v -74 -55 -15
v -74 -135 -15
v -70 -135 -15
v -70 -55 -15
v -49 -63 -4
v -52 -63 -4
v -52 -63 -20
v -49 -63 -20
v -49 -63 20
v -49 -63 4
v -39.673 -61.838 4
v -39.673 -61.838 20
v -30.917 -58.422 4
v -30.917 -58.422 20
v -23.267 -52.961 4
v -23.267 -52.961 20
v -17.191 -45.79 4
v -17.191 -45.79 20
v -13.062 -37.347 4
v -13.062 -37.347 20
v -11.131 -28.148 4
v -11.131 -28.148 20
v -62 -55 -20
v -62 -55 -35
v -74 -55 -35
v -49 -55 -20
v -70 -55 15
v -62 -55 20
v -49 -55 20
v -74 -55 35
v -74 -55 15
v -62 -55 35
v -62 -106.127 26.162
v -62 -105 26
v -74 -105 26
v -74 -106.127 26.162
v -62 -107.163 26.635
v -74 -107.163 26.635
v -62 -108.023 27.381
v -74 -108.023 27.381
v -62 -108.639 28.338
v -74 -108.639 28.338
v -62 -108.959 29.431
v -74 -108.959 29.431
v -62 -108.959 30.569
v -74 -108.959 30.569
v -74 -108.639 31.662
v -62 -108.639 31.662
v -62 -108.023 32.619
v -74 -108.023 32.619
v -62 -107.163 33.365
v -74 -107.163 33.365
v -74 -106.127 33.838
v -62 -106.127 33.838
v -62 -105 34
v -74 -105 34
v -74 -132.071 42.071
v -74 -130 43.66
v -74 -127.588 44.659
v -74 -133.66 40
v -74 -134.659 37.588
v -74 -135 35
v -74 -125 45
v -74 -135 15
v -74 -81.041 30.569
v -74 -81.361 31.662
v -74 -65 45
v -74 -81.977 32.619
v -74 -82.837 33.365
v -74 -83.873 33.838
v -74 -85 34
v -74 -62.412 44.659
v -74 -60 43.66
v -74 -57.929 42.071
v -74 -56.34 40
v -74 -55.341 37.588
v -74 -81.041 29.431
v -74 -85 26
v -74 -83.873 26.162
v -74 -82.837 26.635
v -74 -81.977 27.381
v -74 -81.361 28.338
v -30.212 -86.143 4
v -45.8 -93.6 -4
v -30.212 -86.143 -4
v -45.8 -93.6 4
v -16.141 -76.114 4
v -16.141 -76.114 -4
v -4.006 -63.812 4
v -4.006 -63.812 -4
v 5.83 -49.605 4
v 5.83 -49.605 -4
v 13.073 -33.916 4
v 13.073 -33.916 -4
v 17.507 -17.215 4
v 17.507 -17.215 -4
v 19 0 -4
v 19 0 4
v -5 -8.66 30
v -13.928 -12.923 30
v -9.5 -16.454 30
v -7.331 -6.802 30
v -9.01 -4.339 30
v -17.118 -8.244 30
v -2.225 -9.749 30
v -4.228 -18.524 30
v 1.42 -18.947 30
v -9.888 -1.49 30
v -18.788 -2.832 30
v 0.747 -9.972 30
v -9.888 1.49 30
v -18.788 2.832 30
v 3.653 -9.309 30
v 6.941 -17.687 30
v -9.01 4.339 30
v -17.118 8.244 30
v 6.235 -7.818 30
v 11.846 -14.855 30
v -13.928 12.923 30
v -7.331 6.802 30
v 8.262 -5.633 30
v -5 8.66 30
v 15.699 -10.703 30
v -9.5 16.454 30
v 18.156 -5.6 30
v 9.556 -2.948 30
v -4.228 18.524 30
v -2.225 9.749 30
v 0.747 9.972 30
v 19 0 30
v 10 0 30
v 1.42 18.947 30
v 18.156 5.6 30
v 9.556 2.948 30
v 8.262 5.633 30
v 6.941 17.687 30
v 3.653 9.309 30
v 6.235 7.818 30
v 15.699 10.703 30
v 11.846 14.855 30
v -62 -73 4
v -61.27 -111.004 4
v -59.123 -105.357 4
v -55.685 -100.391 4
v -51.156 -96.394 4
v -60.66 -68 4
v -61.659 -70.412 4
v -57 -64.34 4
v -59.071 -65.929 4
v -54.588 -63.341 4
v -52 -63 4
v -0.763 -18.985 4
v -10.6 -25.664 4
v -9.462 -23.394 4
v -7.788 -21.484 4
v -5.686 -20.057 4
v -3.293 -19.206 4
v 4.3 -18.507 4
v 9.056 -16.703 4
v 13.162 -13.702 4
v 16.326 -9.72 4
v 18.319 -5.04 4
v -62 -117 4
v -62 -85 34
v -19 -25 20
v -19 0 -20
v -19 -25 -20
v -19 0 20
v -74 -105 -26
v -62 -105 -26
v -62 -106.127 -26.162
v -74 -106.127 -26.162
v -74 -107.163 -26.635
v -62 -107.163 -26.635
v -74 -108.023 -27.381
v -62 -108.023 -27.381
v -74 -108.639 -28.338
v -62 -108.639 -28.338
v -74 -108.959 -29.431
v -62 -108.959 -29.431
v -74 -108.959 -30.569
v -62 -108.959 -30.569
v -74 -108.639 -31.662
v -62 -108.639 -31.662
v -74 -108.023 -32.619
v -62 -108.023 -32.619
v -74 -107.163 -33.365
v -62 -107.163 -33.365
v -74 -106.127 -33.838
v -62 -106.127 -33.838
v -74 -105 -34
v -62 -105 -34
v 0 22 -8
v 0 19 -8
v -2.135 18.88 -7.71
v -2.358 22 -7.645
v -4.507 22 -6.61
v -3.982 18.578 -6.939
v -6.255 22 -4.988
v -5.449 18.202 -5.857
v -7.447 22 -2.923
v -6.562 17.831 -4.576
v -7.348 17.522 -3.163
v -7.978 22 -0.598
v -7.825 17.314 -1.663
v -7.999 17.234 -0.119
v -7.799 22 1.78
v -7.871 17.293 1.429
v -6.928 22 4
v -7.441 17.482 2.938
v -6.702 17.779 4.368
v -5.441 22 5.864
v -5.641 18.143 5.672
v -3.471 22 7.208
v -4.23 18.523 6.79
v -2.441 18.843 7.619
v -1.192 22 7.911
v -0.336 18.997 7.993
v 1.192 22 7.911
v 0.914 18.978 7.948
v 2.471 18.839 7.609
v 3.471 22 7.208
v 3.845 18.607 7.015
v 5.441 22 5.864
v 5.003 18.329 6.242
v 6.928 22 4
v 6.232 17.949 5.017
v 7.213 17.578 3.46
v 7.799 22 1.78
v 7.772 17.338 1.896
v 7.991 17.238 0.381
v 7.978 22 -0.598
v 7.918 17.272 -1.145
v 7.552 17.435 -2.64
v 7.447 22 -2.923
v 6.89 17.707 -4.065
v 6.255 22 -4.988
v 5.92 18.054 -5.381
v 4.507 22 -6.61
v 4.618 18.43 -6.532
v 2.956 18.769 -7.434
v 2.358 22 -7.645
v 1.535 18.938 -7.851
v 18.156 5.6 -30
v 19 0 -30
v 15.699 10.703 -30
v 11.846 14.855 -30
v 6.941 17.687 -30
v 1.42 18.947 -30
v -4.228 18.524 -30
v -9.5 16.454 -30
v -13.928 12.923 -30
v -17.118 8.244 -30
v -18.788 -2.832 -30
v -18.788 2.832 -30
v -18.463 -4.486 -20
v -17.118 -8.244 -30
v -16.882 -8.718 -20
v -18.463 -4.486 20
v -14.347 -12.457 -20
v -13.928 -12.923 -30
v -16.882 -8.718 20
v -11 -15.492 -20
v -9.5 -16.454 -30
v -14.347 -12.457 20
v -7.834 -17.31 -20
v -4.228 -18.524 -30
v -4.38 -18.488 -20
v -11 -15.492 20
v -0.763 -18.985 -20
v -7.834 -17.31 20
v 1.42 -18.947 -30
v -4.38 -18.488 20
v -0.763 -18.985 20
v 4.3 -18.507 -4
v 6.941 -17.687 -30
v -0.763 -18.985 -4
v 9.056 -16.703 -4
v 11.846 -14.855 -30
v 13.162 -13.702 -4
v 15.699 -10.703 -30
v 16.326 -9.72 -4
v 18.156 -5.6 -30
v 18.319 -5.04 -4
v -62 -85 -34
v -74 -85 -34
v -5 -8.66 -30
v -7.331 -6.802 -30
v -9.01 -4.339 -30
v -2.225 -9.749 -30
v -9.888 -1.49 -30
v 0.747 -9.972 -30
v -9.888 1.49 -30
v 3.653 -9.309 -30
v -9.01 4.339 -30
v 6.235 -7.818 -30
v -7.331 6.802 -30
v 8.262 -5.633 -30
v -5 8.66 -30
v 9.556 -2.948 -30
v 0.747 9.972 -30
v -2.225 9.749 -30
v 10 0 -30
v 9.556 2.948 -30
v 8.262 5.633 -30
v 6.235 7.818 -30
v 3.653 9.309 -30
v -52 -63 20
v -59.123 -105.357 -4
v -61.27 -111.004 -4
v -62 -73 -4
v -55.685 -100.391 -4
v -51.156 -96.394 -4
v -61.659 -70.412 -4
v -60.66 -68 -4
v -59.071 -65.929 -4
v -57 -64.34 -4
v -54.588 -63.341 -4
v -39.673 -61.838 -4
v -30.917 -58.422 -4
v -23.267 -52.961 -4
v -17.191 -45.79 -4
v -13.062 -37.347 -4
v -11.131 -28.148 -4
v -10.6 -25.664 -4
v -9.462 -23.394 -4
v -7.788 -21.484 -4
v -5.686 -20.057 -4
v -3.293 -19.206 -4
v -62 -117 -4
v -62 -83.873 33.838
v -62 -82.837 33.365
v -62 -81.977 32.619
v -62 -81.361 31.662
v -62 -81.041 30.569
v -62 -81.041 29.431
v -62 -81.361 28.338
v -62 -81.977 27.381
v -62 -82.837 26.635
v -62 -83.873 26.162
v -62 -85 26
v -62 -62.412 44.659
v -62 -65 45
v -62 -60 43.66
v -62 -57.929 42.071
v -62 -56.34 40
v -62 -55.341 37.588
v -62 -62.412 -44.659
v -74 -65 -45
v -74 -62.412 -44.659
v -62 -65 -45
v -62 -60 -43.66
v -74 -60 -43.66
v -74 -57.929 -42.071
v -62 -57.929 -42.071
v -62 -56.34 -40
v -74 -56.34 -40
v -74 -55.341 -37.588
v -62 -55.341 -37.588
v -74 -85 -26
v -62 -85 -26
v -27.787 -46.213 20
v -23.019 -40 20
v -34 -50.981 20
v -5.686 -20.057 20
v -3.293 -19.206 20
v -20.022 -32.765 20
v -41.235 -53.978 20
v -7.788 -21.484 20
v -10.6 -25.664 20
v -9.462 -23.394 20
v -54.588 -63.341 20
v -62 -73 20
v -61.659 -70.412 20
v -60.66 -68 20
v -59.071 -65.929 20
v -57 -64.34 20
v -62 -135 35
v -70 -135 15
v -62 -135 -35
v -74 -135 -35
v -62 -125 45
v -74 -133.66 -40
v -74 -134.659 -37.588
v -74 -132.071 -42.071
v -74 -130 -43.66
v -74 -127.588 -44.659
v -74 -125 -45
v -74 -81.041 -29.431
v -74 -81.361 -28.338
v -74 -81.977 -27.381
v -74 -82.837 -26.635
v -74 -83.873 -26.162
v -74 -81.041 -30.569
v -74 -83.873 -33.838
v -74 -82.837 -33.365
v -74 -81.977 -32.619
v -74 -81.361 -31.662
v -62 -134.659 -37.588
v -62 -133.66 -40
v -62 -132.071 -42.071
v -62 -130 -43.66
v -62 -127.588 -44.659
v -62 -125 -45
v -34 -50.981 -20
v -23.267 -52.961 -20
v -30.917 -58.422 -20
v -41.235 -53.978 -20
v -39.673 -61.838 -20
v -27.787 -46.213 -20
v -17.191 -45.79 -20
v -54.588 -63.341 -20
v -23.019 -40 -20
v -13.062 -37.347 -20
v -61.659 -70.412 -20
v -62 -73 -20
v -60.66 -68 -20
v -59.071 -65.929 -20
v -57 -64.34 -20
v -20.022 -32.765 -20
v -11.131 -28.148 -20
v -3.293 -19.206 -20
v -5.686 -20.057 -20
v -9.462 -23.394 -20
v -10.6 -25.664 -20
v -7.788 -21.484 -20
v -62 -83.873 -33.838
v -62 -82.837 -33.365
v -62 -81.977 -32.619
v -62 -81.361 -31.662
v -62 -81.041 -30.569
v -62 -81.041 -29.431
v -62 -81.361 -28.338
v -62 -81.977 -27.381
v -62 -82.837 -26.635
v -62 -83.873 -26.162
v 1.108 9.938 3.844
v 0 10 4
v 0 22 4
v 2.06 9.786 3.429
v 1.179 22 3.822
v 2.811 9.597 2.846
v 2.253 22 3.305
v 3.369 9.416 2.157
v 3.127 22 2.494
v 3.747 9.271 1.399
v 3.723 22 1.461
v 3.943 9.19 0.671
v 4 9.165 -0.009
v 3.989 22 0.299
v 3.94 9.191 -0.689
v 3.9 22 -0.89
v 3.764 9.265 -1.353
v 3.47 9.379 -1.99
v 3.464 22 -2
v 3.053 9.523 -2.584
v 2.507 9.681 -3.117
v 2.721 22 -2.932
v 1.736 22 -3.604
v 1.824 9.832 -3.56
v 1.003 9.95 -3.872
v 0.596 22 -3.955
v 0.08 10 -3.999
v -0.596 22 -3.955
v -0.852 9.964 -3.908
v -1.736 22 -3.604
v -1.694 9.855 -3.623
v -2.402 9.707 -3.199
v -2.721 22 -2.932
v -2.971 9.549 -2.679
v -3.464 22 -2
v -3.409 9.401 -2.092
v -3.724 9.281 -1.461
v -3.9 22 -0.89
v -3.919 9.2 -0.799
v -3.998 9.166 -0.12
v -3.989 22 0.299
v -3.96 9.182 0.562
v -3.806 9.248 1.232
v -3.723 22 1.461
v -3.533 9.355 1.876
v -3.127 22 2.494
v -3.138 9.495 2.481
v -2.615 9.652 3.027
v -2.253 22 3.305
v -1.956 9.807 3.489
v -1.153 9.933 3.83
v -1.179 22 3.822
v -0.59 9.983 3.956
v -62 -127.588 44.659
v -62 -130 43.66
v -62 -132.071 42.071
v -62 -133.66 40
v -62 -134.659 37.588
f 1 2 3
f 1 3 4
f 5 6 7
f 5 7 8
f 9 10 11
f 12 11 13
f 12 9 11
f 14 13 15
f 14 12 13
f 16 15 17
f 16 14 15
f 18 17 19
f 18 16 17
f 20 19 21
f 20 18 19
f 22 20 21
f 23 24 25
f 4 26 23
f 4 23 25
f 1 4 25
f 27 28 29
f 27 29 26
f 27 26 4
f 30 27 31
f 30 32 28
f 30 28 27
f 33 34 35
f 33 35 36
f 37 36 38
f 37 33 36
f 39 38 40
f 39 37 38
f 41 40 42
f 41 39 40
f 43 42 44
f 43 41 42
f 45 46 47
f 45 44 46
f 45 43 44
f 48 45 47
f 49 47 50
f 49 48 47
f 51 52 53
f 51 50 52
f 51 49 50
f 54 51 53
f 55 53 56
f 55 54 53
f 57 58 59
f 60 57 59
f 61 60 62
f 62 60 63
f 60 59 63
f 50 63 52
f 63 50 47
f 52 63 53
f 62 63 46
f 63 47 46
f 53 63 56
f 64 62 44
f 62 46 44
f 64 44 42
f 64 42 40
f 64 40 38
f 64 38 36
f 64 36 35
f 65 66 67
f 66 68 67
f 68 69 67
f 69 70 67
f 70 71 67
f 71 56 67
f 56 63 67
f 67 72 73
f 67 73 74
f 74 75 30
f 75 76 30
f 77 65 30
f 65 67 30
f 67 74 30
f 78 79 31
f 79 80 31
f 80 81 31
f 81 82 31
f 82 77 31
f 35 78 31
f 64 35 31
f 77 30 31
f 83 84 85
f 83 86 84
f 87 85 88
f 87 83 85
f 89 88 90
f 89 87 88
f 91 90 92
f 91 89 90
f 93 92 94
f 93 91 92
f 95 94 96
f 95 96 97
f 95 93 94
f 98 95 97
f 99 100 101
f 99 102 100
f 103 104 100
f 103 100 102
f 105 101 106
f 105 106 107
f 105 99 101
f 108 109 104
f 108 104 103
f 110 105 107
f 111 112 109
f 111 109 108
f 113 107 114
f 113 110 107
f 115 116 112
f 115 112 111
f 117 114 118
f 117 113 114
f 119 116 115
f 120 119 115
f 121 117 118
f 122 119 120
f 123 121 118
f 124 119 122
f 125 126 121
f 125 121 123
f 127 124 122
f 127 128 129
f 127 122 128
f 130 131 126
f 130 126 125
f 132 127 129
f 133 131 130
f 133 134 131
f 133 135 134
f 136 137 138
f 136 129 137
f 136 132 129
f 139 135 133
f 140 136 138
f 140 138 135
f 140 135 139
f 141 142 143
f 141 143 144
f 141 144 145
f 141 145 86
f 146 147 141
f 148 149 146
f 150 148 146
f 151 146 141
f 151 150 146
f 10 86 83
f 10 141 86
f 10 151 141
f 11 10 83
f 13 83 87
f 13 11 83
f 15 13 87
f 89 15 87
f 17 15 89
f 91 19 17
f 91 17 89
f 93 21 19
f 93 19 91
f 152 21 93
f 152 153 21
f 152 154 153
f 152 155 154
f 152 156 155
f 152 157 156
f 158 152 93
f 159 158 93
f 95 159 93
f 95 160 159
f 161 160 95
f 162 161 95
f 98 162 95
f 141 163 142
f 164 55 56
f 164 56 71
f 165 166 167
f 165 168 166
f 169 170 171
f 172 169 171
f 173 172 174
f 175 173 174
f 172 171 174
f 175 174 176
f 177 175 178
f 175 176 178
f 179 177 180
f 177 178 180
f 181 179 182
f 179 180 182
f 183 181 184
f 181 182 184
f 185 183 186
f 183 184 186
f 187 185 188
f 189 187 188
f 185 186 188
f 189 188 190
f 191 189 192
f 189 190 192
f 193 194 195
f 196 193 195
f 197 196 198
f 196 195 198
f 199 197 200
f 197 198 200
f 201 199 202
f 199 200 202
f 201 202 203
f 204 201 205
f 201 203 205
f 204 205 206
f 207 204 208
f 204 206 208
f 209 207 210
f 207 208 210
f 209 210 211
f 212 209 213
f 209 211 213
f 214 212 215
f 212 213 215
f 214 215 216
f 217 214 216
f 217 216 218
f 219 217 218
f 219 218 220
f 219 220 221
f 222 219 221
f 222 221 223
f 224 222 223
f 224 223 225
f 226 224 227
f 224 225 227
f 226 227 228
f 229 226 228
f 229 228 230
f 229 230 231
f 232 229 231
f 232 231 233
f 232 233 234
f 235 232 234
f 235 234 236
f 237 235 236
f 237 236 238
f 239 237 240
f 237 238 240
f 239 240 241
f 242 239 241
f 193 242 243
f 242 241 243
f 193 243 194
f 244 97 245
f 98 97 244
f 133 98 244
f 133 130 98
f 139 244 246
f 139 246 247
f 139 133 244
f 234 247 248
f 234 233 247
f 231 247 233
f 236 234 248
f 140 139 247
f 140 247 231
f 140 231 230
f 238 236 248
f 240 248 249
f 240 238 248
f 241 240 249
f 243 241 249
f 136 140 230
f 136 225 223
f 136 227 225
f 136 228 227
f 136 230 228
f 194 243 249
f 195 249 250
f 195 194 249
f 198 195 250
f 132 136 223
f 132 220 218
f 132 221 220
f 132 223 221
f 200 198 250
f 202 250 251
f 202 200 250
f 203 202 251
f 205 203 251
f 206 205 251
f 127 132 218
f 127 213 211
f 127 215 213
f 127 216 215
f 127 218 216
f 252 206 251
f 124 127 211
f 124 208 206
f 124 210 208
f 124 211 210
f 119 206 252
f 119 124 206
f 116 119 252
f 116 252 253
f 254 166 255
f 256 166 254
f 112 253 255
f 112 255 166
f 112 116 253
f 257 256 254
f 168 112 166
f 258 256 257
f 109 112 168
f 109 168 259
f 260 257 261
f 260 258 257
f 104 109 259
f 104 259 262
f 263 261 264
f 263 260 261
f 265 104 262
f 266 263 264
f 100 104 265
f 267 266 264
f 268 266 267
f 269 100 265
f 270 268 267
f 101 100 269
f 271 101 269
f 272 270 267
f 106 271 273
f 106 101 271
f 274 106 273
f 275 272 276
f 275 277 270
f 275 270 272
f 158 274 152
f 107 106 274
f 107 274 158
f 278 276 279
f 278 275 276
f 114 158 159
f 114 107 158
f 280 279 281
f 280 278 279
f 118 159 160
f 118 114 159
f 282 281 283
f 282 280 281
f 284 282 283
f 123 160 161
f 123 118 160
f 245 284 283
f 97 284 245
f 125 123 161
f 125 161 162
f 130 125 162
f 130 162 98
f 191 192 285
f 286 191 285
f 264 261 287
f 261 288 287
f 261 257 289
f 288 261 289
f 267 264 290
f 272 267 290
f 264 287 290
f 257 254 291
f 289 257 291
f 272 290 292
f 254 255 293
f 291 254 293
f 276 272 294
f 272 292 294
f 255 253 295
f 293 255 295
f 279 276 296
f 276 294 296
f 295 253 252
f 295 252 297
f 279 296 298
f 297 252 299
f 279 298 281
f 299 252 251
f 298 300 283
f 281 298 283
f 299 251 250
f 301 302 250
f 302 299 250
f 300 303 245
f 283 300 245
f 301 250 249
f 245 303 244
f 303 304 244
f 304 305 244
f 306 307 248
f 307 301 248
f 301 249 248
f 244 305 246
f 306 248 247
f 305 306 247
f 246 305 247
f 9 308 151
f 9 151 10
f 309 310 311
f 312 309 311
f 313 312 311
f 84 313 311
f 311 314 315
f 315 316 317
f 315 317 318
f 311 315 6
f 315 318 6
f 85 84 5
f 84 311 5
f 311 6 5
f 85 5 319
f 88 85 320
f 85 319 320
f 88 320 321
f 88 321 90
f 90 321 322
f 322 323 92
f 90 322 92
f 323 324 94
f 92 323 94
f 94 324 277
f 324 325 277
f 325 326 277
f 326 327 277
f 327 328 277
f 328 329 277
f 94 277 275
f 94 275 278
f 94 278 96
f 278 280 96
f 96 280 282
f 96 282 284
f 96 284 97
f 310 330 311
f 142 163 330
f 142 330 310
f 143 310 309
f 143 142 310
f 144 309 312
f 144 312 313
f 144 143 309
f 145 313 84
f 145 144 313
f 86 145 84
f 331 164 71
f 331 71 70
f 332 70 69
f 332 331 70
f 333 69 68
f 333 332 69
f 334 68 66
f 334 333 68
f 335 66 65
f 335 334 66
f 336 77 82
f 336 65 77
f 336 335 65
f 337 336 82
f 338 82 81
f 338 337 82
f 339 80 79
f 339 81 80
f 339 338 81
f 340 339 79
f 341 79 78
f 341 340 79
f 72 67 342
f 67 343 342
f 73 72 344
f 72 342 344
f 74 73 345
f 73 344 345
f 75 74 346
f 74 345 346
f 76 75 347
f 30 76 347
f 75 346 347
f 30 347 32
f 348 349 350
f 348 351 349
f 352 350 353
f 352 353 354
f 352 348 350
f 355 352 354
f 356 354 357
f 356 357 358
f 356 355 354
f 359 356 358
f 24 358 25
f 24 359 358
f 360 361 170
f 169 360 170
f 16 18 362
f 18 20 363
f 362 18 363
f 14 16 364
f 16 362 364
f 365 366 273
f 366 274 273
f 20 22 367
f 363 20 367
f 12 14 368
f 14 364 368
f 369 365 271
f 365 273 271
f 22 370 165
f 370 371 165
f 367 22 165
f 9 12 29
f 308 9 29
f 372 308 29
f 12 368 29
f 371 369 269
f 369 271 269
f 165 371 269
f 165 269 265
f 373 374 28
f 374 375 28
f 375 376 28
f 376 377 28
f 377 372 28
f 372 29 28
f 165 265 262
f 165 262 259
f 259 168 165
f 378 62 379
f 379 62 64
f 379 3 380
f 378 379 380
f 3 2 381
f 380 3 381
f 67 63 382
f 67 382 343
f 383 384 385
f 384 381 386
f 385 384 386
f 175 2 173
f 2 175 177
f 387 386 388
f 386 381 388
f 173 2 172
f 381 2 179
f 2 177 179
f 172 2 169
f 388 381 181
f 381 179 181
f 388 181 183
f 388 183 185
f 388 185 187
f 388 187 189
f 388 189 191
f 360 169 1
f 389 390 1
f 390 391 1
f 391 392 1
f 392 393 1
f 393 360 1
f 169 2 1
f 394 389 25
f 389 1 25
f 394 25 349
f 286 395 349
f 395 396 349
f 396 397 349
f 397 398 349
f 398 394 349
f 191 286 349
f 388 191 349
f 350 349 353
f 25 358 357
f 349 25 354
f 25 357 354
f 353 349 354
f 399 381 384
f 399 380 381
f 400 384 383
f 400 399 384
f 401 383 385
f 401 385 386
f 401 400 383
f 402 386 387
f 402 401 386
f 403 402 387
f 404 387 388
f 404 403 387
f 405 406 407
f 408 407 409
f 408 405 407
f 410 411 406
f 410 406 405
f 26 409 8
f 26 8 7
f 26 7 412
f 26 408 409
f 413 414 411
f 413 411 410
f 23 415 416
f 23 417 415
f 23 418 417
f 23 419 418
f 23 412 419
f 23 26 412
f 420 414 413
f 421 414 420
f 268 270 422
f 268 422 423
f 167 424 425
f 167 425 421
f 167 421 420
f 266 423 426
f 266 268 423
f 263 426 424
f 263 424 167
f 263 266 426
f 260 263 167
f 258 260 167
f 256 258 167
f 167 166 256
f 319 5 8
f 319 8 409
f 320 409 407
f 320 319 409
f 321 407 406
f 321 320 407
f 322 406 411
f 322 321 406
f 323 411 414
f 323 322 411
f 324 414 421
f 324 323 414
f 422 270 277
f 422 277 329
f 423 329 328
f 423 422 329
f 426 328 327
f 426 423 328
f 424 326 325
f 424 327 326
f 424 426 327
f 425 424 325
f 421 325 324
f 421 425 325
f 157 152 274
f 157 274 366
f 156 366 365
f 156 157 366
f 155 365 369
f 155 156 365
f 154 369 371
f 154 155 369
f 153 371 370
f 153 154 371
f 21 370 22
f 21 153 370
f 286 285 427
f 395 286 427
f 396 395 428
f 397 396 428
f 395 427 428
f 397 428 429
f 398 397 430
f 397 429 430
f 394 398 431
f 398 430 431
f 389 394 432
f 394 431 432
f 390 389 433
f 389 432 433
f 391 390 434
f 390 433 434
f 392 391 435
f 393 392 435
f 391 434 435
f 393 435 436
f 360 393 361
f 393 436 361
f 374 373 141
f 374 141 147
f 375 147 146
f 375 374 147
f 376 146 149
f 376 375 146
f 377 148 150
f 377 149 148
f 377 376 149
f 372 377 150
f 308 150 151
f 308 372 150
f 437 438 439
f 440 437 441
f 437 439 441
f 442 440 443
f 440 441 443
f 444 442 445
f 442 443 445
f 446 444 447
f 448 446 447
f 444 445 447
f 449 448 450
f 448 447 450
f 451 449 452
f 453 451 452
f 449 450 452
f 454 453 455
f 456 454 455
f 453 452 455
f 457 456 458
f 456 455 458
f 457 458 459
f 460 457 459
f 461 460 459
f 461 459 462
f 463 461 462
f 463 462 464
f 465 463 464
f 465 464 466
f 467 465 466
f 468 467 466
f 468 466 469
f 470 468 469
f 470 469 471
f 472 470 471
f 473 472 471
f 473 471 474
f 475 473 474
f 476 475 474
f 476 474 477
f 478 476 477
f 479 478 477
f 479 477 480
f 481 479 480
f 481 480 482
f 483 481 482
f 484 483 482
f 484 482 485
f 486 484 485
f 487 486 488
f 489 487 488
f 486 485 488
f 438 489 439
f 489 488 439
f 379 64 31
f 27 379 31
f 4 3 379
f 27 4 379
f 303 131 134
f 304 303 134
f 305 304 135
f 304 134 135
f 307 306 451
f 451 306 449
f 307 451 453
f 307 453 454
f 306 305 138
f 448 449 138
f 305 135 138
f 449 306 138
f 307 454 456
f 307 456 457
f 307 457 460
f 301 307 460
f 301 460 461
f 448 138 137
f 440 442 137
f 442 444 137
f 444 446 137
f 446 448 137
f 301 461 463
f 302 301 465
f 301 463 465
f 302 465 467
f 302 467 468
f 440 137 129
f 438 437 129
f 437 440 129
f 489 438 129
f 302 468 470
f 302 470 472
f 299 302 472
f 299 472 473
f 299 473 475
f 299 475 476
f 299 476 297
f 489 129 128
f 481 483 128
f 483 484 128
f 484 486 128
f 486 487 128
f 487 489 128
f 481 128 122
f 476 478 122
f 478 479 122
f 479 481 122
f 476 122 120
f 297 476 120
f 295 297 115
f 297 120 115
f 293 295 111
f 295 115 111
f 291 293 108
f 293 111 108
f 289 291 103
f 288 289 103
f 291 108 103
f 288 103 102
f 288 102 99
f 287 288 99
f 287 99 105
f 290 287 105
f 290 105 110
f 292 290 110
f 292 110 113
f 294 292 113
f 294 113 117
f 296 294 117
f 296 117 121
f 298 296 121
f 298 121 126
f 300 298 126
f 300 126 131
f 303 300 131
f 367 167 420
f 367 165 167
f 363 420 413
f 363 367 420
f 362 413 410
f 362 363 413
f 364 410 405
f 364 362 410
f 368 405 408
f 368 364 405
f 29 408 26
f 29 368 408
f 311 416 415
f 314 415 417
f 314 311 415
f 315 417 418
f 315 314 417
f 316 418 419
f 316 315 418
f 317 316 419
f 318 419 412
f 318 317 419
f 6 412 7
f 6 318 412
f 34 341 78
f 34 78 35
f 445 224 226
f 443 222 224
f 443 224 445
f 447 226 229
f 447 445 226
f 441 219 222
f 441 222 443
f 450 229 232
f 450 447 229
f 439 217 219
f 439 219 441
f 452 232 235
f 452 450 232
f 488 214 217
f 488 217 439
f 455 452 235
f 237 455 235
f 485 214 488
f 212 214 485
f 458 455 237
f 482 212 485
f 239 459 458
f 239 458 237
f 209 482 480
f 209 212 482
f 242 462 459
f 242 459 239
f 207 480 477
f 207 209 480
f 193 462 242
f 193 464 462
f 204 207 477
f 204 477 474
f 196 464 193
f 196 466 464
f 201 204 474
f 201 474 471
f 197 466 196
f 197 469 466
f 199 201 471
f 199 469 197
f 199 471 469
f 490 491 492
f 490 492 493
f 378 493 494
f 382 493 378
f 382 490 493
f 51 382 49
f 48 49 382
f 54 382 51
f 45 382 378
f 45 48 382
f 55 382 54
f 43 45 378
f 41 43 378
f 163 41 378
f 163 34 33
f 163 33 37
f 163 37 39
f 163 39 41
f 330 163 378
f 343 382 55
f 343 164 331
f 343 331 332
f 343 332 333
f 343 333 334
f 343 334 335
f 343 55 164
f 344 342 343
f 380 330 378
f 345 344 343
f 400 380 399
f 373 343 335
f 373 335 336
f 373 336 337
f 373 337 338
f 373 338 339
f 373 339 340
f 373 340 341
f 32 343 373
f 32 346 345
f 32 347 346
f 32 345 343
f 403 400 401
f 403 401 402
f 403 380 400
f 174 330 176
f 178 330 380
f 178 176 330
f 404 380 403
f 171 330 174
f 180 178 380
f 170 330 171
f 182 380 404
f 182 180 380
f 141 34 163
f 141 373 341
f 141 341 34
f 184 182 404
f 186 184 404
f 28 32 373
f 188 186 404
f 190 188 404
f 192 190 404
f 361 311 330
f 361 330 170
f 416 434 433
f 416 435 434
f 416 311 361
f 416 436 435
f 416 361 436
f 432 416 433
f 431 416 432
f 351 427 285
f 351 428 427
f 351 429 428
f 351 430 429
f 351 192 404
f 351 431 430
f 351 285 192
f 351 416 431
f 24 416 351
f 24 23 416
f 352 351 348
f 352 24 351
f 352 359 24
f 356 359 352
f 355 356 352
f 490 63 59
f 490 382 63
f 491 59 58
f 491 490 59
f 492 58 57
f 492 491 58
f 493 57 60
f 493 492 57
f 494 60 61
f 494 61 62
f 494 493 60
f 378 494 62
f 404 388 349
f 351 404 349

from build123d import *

# Parameters (mm, degrees)
SKETCH_1_R               = 19
EXTRUDE_1_DEPTH          = 30
SKETCH_2_R               = 8
EXTRUDE_2_DEPTH          = 22
SKETCH_3_R               = 10
CUT_EXTRUDE_1_DEPTH      = 67.670833355
CUT_EXTRUDE_2_REACH      = 56.24
CUT_EXTRUDE_2_END_RADIUS = 10
SKETCH_4_R               = 4
EXTRUDE_START            = -74
SKETCH_5_W               = 90
SKETCH_5_H               = 80
EXTRUDE_3_DEPTH          = 12
FILLET_1_R               = 10
SKETCH_6_W               = 30
SKETCH_6_H               = 80
CUT_EXTRUDE_3_DEPTH      = 4
CUT_EXTRUDE_4_DEPTH      = 164.740648637
EXTRUDE_4_DEPTH          = 4
EXTRUDE_5_DEPTH          = 20
FILLET_2_R               = 10


with BuildPart() as part:
    # 草图1 → 凸台-拉伸1 (new, symmetric)
    with BuildSketch(Plane.XY):
        Circle(SKETCH_1_R)
    extrude(amount=EXTRUDE_1_DEPTH, both=True)

    # 草图2 → 凸台-拉伸2 (add)
    with BuildSketch(Plane(origin=(0, 0, 0), x_dir=(1, 0, 0), z_dir=(0, 1, 0))):
        with Locations(Location((0, 0, 0), (0, 0, 90))):
            Circle(SKETCH_2_R)
    extrude(amount=EXTRUDE_2_DEPTH)

    # 草图3 → 切除-拉伸1 (cut, through all)
    with BuildSketch(Plane.XY.offset(30)):
        Circle(SKETCH_3_R)
    extrude(amount=-CUT_EXTRUDE_1_DEPTH, mode=Mode.SUBTRACT)

    # 切除-拉伸2: up to this cylinder (the profile starts outside it)
    cut_extrude_2_end = Plane(origin=(0, 0, 0), z_dir=(0, 0, 1)) * Cylinder(CUT_EXTRUDE_2_END_RADIUS, 133.48, mode=Mode.PRIVATE)
    # 草图4 → 切除-拉伸2 (cut, up to the surface)
    with BuildSketch(Plane(origin=(0, 22, 0), x_dir=(1, 0, 0), z_dir=(0, 1, 0)), mode=Mode.PRIVATE) as cut_extrude_2_sk1:
        with Locations(Location((0, 0, 0), (0, 0, 270))):
            Circle(SKETCH_4_R)
    cut_extrude_2_tool1 = extrude(cut_extrude_2_sk1.sketch, amount=-CUT_EXTRUDE_2_REACH, mode=Mode.PRIVATE) - cut_extrude_2_end
    add(cut_extrude_2_tool1.solids().sort_by_distance((0, 22, 0))[0], mode=Mode.SUBTRACT)



with BuildPart() as body_2:
    # 草图5 → 凸台-拉伸3 (new body)
    with BuildSketch(Plane(origin=(0, 0, 0), x_dir=(0, 0, -1), z_dir=(1, 0, 0)).offset(EXTRUDE_START)):
        with Locations((0, -95)):
            Rectangle(SKETCH_5_W, SKETCH_5_H)
    extrude(amount=EXTRUDE_3_DEPTH)

    # 圆角1
    fillet_1_edges = [body_2.edges().sort_by_distance(p)[0] for p in [
        (-68, -135, -45),
        (-68, -135, 45),
        (-68, -55, 45),
        (-68, -55, -45),
    ]]
    fillet(fillet_1_edges, radius=FILLET_1_R)

    # 草图6 → 切除-拉伸3 (cut)
    with BuildSketch(Plane.ZY.offset(74)):
        with Locations((0, -95)):
            Rectangle(SKETCH_6_W, SKETCH_6_H)
    extrude(amount=-CUT_EXTRUDE_3_DEPTH, mode=Mode.SUBTRACT)

    # 草图7 → 切除-拉伸4 (cut, through all)
    with BuildSketch(Plane(origin=(-62, 0, 0), x_dir=(0, 0, -1), z_dir=(1, 0, 0))):
        with BuildLine():
            Line((-26, -85), (-26, -105))
            ThreePointArc((-26, -105), (-30, -109), (-34, -105))
            Line((-34, -105), (-34, -85))
            ThreePointArc((-34, -85), (-30, -81), (-26, -85))
        make_face()
    cut_extrude_4 = extrude(amount=-CUT_EXTRUDE_4_DEPTH, mode=Mode.SUBTRACT)

    # 镜向1: 切除-拉伸4 across plane
    add(cut_extrude_4.mirror(Plane.XY), mode=Mode.SUBTRACT)


with BuildPart() as part_1:
    add(part.part)

    add(body_2.part)  # 凸台-拉伸4 merges body 2
    # 草图8 → 凸台-拉伸4 (add, symmetric)
    with BuildSketch(Plane.XY):
        with BuildLine():
            Line((-19, 0), (-19, -25))
            ThreePointArc((-19, -25), (-27.786796564, -46.213203436), (-49, -55))
            Line((-49, -55), (-62, -55))
            Line((-62, -55), (-62, -117))
            ThreePointArc((-62, -117), (-57.554804791, -102.769750529), (-45.8, -93.6))
            ThreePointArc((-45.8, -93.6), (1.219219164, -56.920997883), (19, 0))
            ThreePointArc((19, 0), (0, -19), (-19, 0))
        make_face()
    extrude(amount=EXTRUDE_4_DEPTH, both=True)

    # 草图9 → 凸台-拉伸5 (add, symmetric)
    with BuildSketch(Plane.XY):
        with BuildLine():
            Line((-49, -55), (-62, -55))
            Line((-62, -55), (-62, -73))
            ThreePointArc((-62, -73), (-59.071067812, -65.928932188), (-52, -63))
            Line((-52, -63), (-49, -63))
            ThreePointArc((-49, -63), (-22.129942315, -51.870057685), (-11, -25))
            Line((-11, -25), (-11, -15.491933385))
            ThreePointArc((-11, -15.491933385), (-16.881943016, -8.717797887), (-19, 0))
            Line((-19, 0), (-19, -25))
            ThreePointArc((-19, -25), (-27.786796564, -46.213203436), (-49, -55))
        make_face()
    extrude(amount=EXTRUDE_5_DEPTH, both=True)

    # 圆角2
    # the kernel refuses this fillet: 10 mm, written as the material it adds along each edge
    with BuildSketch(Plane(origin=(-11, -15.491933385, -20), x_dir=(0.9464272027660603, -0.32291724925189497, 0), z_dir=(0, 0, 1))) as fillet_2_piece_1_section:
        with BuildLine():
            CenterArc((13.662534862, -9.586356274), FILLET_2_R, 106.537100336, 87.550188329)
            Line((3.963274477, -12.020354626), (2.993348438, -12.263754461))
            ThreePointArc((2.993348438, -12.263754461), (2.123891514, -9.32161014), (-0.946427203, -0.322917249))
            Line((-0.946427203, -0.322917249), (0.284636143, 0.958635627))
            ThreePointArc((0.284636143, 0.958635627), (5.408086716, 0.214076921), (10.531537289, 0.958635627))
            Line((10.531537289, 0.958635627), (10.816173432, 0))
        make_face()
    fillet_2_piece_1 = extrude(amount=47.642186032, mode=Mode.PRIVATE)
    fillet_2_piece_1 = split(fillet_2_piece_1, bisect_by=Plane(origin=(-8.746000777, -19.792422089, 20), z_dir=(0, 0, -1)), keep=Keep.TOP, mode=Mode.PRIVATE)
    add(fillet_2_piece_1)
    with BuildSketch(Plane(origin=(-11, -15.491933385, -27.642186032), x_dir=(0.9464272027660603, -0.32291724925189513, 0), z_dir=(0, 0, 1))) as fillet_2_piece_2_section:
        with BuildLine():
            CenterArc((13.662534862, -9.586356274), FILLET_2_R, 106.537100336, 87.550188329)
            Line((3.963274477, -12.020354626), (2.993348438, -12.263754461))
            ThreePointArc((2.993348438, -12.263754461), (2.123891514, -9.32161014), (-0.946427203, -0.322917249))
            Line((-0.946427203, -0.322917249), (0.284636143, 0.958635627))
            ThreePointArc((0.284636143, 0.958635627), (5.408086716, 0.214076921), (10.531537289, 0.958635627))
            Line((10.531537289, 0.958635627), (10.816173432, 0))
        make_face()
    fillet_2_piece_2 = extrude(amount=47.642186032, mode=Mode.PRIVATE)
    fillet_2_piece_2 = split(fillet_2_piece_2, bisect_by=Plane(origin=(-8.746000777, -19.792422089, -20), z_dir=(0, 0, 1)), keep=Keep.TOP, mode=Mode.PRIVATE)
    add(fillet_2_piece_2)


solid = part_1.part
